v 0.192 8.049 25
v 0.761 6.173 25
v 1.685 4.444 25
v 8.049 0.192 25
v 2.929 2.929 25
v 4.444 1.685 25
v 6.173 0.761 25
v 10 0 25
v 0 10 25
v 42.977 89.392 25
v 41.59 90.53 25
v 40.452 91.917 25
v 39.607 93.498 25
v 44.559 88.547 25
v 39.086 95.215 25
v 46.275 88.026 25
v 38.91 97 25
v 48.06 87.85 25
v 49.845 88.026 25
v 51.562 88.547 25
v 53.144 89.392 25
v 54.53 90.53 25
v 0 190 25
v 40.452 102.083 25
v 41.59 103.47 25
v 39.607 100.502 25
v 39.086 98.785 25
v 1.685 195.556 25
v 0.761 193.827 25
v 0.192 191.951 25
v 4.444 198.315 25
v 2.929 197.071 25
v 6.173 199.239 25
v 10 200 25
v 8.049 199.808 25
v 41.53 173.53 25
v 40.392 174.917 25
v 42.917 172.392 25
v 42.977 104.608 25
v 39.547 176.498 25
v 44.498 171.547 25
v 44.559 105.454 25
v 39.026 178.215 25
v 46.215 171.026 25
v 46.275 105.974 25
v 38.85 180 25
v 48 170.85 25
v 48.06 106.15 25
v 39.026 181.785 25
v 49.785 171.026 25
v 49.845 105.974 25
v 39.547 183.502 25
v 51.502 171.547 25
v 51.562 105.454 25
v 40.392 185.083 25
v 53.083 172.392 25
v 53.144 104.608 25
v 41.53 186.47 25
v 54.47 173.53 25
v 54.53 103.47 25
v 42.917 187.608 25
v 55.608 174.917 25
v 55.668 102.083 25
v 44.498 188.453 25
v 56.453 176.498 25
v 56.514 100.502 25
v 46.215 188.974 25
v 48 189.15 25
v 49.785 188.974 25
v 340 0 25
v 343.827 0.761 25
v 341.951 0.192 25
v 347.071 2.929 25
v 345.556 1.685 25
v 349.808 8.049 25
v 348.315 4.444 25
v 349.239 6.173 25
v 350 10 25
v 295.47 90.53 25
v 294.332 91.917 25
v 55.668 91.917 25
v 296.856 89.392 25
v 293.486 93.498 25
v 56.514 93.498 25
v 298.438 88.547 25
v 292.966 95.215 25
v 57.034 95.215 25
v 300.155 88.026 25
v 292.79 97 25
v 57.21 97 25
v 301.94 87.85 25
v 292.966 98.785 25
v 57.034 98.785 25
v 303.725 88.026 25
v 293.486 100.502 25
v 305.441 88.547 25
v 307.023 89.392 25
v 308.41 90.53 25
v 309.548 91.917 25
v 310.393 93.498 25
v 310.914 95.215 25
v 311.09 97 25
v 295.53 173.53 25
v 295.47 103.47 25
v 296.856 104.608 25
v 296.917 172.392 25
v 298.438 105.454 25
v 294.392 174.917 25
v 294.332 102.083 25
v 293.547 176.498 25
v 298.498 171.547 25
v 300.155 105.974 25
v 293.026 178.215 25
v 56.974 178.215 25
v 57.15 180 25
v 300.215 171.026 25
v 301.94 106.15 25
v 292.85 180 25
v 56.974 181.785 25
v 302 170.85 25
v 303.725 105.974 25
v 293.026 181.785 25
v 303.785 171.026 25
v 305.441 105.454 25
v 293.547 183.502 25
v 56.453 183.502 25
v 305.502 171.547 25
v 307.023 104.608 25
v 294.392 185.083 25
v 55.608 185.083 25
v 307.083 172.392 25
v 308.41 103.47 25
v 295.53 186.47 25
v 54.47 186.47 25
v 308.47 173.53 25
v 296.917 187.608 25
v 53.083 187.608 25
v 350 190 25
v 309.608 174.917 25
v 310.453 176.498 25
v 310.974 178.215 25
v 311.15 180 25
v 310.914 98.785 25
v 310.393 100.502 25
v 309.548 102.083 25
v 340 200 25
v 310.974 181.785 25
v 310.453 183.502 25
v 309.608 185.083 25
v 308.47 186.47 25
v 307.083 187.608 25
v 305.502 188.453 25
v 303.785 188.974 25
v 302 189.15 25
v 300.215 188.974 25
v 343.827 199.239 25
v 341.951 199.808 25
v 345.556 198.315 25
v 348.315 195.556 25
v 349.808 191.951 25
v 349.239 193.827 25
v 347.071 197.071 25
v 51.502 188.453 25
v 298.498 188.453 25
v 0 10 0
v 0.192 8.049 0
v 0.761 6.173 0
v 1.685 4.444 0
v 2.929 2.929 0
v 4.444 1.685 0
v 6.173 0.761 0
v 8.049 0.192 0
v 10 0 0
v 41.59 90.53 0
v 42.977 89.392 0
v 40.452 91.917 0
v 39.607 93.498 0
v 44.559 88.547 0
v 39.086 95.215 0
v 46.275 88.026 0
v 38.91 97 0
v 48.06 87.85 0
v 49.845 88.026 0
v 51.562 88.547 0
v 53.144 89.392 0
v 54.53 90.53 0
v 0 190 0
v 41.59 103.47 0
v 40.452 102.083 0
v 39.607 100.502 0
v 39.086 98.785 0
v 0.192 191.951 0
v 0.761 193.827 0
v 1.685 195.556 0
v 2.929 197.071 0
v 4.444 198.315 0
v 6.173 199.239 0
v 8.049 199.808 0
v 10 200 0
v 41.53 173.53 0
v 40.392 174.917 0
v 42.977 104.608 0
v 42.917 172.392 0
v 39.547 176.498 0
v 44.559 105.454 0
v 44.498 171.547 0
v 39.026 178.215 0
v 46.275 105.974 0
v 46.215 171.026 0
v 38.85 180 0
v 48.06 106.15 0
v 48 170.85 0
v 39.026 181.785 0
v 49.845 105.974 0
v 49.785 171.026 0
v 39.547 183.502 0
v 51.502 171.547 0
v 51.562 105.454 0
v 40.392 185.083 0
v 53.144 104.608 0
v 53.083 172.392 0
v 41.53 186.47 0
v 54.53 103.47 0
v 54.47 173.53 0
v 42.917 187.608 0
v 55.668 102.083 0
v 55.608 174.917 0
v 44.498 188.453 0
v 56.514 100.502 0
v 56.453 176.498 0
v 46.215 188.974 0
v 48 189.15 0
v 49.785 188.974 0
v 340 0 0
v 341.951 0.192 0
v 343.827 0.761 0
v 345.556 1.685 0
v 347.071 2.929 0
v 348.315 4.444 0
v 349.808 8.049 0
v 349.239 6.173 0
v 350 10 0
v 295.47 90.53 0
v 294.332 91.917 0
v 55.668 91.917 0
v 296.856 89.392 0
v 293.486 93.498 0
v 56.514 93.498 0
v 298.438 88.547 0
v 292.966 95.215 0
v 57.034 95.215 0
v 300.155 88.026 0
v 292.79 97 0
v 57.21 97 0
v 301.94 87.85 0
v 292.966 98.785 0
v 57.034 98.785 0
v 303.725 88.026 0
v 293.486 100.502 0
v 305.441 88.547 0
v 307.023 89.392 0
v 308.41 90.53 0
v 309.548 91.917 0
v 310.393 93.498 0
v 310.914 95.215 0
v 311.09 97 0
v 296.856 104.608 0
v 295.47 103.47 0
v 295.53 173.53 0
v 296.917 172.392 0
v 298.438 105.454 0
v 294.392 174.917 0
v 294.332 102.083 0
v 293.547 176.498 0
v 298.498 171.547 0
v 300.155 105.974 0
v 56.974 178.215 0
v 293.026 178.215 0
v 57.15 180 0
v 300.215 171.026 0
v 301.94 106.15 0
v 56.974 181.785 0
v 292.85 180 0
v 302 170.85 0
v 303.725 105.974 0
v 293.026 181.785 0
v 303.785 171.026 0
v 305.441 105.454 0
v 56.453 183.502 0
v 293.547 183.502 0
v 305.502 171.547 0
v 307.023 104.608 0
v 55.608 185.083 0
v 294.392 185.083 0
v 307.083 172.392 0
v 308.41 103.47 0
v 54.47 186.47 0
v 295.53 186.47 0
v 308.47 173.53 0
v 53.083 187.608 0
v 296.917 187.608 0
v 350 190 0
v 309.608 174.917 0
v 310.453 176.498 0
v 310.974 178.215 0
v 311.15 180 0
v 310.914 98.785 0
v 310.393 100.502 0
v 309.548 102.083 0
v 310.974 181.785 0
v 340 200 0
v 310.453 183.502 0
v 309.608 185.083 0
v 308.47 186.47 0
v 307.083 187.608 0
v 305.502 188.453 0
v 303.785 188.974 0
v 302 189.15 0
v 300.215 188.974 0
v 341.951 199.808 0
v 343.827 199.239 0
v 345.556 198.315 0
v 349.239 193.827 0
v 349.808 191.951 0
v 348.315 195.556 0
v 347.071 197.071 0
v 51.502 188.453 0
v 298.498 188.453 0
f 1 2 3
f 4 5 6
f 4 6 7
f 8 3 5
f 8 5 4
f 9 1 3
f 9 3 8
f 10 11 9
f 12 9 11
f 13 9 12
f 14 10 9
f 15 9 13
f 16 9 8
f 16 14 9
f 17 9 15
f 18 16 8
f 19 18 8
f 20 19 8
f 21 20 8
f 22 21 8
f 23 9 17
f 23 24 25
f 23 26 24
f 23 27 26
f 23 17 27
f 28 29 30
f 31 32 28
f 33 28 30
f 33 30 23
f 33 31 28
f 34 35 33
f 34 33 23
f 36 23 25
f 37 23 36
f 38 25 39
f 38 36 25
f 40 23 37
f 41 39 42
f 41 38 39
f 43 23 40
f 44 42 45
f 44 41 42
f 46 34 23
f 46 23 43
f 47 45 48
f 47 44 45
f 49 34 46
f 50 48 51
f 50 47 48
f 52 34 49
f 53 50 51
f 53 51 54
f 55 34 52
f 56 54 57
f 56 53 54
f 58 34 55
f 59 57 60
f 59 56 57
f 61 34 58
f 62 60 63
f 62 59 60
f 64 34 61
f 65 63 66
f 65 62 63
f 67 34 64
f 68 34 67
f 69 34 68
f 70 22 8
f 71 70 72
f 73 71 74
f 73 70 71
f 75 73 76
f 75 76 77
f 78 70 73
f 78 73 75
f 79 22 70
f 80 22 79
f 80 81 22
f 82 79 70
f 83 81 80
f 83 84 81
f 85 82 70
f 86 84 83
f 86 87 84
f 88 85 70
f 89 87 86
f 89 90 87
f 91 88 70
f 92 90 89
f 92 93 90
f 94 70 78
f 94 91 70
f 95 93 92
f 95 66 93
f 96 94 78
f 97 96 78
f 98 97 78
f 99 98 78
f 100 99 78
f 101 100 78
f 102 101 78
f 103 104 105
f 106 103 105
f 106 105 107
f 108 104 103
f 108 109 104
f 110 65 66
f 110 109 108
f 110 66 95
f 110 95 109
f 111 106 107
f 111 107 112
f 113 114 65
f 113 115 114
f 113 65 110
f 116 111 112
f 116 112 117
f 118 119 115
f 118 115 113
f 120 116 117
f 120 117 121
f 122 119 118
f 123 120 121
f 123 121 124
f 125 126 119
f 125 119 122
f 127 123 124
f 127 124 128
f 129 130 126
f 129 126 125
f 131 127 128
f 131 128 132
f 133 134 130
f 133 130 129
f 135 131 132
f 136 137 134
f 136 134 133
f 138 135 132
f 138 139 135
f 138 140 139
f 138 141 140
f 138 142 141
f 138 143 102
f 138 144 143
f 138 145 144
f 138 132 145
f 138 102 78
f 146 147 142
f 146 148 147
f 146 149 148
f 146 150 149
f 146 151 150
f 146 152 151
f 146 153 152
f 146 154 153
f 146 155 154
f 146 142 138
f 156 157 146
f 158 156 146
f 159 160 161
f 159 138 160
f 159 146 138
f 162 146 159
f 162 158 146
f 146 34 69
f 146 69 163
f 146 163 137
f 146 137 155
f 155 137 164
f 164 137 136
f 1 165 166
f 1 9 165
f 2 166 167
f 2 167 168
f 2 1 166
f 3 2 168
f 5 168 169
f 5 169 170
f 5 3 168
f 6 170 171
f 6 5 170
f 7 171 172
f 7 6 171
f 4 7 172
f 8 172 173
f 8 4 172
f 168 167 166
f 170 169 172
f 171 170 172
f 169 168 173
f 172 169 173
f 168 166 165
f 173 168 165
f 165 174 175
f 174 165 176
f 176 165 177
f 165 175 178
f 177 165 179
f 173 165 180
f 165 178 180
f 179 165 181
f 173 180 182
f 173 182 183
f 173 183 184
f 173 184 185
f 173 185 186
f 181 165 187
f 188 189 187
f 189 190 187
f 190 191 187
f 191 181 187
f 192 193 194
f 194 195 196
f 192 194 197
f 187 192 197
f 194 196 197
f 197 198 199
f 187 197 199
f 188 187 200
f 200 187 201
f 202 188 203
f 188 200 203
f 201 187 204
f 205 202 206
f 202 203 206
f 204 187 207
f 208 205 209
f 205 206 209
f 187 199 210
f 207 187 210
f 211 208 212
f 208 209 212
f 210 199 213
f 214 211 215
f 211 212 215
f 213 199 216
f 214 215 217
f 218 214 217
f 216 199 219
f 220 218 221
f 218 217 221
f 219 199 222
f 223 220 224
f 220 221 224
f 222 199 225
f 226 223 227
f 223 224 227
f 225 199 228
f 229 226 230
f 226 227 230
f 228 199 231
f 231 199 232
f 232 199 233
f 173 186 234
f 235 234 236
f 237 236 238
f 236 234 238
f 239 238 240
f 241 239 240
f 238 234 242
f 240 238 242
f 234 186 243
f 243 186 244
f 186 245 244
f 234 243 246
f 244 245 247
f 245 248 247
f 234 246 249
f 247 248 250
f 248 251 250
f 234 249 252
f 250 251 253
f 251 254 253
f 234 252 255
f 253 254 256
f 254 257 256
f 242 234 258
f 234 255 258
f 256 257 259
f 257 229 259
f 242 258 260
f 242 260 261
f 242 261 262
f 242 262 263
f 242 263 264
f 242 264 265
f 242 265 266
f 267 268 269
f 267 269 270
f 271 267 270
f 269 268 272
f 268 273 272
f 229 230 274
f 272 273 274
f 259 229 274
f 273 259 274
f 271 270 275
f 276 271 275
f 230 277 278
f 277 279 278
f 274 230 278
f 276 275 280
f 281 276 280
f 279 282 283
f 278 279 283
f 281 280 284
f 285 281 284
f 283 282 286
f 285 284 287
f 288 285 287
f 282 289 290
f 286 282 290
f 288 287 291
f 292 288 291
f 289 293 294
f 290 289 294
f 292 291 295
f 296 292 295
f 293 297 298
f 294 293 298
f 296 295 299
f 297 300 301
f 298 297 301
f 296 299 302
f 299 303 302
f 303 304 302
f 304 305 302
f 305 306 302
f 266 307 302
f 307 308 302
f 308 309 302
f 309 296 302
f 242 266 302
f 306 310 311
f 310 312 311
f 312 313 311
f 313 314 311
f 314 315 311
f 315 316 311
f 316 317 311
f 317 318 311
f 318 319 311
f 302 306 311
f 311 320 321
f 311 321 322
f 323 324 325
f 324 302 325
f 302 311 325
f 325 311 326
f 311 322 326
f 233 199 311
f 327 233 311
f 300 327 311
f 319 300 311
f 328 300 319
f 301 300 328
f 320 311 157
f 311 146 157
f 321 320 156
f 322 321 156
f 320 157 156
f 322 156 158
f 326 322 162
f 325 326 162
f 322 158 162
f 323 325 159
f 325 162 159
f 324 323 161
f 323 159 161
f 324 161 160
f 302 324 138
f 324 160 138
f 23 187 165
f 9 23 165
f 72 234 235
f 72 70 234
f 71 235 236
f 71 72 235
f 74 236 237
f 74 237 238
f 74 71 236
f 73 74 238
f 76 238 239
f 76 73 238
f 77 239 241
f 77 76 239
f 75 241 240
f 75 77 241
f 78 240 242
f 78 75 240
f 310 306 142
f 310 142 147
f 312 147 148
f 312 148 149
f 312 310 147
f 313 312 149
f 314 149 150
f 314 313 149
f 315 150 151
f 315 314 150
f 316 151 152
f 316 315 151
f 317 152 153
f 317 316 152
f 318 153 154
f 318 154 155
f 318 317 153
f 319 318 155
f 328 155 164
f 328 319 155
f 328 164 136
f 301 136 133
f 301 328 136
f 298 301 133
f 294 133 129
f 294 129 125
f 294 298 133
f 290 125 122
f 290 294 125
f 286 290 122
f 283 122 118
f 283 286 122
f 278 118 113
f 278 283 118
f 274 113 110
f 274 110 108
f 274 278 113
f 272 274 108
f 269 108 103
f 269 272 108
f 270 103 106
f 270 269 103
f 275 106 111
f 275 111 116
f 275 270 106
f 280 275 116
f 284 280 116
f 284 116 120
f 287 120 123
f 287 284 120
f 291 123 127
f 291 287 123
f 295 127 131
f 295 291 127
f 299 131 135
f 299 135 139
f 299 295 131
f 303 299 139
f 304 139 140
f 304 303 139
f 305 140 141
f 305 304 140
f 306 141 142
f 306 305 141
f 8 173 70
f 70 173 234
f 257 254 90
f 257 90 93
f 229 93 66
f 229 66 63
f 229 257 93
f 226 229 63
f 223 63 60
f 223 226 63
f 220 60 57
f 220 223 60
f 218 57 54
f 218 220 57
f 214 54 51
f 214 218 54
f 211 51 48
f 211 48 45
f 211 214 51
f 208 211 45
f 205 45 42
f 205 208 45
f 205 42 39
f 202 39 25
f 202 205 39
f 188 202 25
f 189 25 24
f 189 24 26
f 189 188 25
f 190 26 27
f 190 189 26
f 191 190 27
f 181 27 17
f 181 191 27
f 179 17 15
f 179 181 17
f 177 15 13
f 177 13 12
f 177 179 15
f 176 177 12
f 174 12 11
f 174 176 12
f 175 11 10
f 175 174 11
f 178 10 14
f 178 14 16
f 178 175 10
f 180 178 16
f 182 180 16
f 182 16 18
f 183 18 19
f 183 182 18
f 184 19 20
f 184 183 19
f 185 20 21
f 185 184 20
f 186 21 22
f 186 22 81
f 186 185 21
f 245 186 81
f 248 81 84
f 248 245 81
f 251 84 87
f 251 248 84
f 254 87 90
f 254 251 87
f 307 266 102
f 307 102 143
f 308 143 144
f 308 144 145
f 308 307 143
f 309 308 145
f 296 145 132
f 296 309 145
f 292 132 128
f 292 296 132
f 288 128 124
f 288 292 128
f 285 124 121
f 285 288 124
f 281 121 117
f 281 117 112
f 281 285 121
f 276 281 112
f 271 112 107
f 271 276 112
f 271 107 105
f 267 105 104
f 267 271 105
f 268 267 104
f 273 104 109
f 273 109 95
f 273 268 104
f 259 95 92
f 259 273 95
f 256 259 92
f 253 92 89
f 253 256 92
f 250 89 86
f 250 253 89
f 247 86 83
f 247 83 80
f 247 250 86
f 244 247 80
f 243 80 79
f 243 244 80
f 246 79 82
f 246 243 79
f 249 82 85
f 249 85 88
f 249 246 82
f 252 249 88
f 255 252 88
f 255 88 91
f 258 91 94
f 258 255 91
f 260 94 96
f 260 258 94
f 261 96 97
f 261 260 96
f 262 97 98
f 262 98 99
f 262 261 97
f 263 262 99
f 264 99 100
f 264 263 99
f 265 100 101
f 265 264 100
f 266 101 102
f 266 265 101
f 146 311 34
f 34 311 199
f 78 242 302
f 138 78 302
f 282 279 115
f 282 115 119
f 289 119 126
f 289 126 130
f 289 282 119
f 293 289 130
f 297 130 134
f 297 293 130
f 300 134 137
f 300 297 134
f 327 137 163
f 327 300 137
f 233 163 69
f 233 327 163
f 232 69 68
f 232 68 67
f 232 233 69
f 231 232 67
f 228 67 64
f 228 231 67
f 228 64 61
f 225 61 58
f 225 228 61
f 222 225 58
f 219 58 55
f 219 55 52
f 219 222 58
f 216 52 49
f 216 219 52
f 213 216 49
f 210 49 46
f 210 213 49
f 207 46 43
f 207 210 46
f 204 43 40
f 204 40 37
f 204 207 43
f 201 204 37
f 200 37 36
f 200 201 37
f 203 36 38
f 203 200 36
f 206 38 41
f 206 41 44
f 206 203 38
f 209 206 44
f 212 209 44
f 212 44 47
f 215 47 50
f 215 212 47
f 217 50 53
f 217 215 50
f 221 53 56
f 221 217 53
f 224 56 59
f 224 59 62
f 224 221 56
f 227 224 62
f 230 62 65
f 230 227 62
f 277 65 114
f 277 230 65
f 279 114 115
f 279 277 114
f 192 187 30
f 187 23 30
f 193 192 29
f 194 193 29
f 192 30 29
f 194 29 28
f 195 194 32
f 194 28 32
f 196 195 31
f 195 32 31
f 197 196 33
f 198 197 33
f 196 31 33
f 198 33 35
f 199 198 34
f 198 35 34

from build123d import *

# Parameters (mm, degrees)
F0_R     = 9.15
F1_DEPTH = 25
F2_R     = 10


with BuildPart() as f1:
    # F0 (on Top) → F1 (new body)
    with BuildSketch(Plane.XY):
        Polygon((175, 200), (0, 200), (0, 0), (350, 0), (350, 200), align=None)
        with Locations((48.060222, 97.000022)):
            Circle(F0_R, mode=Mode.SUBTRACT)
        with Locations((301.939778, 97.000022)):
            Circle(F0_R, mode=Mode.SUBTRACT)
        with Locations((48, 180)):
            Circle(F0_R, mode=Mode.SUBTRACT)
        with Locations((302, 180)):
            Circle(F0_R, mode=Mode.SUBTRACT)
    extrude(amount=F1_DEPTH)

    # F2
    f2_edges = [f1.edges().sort_by_distance(p)[0] for p in [
        (350, 0, 12.5),
        (350, 200, 12.5),
        (0, 0, 12.5),
        (0, 200, 12.5),
    ]]
    fillet(f2_edges, radius=F2_R)


solid = f1.part
